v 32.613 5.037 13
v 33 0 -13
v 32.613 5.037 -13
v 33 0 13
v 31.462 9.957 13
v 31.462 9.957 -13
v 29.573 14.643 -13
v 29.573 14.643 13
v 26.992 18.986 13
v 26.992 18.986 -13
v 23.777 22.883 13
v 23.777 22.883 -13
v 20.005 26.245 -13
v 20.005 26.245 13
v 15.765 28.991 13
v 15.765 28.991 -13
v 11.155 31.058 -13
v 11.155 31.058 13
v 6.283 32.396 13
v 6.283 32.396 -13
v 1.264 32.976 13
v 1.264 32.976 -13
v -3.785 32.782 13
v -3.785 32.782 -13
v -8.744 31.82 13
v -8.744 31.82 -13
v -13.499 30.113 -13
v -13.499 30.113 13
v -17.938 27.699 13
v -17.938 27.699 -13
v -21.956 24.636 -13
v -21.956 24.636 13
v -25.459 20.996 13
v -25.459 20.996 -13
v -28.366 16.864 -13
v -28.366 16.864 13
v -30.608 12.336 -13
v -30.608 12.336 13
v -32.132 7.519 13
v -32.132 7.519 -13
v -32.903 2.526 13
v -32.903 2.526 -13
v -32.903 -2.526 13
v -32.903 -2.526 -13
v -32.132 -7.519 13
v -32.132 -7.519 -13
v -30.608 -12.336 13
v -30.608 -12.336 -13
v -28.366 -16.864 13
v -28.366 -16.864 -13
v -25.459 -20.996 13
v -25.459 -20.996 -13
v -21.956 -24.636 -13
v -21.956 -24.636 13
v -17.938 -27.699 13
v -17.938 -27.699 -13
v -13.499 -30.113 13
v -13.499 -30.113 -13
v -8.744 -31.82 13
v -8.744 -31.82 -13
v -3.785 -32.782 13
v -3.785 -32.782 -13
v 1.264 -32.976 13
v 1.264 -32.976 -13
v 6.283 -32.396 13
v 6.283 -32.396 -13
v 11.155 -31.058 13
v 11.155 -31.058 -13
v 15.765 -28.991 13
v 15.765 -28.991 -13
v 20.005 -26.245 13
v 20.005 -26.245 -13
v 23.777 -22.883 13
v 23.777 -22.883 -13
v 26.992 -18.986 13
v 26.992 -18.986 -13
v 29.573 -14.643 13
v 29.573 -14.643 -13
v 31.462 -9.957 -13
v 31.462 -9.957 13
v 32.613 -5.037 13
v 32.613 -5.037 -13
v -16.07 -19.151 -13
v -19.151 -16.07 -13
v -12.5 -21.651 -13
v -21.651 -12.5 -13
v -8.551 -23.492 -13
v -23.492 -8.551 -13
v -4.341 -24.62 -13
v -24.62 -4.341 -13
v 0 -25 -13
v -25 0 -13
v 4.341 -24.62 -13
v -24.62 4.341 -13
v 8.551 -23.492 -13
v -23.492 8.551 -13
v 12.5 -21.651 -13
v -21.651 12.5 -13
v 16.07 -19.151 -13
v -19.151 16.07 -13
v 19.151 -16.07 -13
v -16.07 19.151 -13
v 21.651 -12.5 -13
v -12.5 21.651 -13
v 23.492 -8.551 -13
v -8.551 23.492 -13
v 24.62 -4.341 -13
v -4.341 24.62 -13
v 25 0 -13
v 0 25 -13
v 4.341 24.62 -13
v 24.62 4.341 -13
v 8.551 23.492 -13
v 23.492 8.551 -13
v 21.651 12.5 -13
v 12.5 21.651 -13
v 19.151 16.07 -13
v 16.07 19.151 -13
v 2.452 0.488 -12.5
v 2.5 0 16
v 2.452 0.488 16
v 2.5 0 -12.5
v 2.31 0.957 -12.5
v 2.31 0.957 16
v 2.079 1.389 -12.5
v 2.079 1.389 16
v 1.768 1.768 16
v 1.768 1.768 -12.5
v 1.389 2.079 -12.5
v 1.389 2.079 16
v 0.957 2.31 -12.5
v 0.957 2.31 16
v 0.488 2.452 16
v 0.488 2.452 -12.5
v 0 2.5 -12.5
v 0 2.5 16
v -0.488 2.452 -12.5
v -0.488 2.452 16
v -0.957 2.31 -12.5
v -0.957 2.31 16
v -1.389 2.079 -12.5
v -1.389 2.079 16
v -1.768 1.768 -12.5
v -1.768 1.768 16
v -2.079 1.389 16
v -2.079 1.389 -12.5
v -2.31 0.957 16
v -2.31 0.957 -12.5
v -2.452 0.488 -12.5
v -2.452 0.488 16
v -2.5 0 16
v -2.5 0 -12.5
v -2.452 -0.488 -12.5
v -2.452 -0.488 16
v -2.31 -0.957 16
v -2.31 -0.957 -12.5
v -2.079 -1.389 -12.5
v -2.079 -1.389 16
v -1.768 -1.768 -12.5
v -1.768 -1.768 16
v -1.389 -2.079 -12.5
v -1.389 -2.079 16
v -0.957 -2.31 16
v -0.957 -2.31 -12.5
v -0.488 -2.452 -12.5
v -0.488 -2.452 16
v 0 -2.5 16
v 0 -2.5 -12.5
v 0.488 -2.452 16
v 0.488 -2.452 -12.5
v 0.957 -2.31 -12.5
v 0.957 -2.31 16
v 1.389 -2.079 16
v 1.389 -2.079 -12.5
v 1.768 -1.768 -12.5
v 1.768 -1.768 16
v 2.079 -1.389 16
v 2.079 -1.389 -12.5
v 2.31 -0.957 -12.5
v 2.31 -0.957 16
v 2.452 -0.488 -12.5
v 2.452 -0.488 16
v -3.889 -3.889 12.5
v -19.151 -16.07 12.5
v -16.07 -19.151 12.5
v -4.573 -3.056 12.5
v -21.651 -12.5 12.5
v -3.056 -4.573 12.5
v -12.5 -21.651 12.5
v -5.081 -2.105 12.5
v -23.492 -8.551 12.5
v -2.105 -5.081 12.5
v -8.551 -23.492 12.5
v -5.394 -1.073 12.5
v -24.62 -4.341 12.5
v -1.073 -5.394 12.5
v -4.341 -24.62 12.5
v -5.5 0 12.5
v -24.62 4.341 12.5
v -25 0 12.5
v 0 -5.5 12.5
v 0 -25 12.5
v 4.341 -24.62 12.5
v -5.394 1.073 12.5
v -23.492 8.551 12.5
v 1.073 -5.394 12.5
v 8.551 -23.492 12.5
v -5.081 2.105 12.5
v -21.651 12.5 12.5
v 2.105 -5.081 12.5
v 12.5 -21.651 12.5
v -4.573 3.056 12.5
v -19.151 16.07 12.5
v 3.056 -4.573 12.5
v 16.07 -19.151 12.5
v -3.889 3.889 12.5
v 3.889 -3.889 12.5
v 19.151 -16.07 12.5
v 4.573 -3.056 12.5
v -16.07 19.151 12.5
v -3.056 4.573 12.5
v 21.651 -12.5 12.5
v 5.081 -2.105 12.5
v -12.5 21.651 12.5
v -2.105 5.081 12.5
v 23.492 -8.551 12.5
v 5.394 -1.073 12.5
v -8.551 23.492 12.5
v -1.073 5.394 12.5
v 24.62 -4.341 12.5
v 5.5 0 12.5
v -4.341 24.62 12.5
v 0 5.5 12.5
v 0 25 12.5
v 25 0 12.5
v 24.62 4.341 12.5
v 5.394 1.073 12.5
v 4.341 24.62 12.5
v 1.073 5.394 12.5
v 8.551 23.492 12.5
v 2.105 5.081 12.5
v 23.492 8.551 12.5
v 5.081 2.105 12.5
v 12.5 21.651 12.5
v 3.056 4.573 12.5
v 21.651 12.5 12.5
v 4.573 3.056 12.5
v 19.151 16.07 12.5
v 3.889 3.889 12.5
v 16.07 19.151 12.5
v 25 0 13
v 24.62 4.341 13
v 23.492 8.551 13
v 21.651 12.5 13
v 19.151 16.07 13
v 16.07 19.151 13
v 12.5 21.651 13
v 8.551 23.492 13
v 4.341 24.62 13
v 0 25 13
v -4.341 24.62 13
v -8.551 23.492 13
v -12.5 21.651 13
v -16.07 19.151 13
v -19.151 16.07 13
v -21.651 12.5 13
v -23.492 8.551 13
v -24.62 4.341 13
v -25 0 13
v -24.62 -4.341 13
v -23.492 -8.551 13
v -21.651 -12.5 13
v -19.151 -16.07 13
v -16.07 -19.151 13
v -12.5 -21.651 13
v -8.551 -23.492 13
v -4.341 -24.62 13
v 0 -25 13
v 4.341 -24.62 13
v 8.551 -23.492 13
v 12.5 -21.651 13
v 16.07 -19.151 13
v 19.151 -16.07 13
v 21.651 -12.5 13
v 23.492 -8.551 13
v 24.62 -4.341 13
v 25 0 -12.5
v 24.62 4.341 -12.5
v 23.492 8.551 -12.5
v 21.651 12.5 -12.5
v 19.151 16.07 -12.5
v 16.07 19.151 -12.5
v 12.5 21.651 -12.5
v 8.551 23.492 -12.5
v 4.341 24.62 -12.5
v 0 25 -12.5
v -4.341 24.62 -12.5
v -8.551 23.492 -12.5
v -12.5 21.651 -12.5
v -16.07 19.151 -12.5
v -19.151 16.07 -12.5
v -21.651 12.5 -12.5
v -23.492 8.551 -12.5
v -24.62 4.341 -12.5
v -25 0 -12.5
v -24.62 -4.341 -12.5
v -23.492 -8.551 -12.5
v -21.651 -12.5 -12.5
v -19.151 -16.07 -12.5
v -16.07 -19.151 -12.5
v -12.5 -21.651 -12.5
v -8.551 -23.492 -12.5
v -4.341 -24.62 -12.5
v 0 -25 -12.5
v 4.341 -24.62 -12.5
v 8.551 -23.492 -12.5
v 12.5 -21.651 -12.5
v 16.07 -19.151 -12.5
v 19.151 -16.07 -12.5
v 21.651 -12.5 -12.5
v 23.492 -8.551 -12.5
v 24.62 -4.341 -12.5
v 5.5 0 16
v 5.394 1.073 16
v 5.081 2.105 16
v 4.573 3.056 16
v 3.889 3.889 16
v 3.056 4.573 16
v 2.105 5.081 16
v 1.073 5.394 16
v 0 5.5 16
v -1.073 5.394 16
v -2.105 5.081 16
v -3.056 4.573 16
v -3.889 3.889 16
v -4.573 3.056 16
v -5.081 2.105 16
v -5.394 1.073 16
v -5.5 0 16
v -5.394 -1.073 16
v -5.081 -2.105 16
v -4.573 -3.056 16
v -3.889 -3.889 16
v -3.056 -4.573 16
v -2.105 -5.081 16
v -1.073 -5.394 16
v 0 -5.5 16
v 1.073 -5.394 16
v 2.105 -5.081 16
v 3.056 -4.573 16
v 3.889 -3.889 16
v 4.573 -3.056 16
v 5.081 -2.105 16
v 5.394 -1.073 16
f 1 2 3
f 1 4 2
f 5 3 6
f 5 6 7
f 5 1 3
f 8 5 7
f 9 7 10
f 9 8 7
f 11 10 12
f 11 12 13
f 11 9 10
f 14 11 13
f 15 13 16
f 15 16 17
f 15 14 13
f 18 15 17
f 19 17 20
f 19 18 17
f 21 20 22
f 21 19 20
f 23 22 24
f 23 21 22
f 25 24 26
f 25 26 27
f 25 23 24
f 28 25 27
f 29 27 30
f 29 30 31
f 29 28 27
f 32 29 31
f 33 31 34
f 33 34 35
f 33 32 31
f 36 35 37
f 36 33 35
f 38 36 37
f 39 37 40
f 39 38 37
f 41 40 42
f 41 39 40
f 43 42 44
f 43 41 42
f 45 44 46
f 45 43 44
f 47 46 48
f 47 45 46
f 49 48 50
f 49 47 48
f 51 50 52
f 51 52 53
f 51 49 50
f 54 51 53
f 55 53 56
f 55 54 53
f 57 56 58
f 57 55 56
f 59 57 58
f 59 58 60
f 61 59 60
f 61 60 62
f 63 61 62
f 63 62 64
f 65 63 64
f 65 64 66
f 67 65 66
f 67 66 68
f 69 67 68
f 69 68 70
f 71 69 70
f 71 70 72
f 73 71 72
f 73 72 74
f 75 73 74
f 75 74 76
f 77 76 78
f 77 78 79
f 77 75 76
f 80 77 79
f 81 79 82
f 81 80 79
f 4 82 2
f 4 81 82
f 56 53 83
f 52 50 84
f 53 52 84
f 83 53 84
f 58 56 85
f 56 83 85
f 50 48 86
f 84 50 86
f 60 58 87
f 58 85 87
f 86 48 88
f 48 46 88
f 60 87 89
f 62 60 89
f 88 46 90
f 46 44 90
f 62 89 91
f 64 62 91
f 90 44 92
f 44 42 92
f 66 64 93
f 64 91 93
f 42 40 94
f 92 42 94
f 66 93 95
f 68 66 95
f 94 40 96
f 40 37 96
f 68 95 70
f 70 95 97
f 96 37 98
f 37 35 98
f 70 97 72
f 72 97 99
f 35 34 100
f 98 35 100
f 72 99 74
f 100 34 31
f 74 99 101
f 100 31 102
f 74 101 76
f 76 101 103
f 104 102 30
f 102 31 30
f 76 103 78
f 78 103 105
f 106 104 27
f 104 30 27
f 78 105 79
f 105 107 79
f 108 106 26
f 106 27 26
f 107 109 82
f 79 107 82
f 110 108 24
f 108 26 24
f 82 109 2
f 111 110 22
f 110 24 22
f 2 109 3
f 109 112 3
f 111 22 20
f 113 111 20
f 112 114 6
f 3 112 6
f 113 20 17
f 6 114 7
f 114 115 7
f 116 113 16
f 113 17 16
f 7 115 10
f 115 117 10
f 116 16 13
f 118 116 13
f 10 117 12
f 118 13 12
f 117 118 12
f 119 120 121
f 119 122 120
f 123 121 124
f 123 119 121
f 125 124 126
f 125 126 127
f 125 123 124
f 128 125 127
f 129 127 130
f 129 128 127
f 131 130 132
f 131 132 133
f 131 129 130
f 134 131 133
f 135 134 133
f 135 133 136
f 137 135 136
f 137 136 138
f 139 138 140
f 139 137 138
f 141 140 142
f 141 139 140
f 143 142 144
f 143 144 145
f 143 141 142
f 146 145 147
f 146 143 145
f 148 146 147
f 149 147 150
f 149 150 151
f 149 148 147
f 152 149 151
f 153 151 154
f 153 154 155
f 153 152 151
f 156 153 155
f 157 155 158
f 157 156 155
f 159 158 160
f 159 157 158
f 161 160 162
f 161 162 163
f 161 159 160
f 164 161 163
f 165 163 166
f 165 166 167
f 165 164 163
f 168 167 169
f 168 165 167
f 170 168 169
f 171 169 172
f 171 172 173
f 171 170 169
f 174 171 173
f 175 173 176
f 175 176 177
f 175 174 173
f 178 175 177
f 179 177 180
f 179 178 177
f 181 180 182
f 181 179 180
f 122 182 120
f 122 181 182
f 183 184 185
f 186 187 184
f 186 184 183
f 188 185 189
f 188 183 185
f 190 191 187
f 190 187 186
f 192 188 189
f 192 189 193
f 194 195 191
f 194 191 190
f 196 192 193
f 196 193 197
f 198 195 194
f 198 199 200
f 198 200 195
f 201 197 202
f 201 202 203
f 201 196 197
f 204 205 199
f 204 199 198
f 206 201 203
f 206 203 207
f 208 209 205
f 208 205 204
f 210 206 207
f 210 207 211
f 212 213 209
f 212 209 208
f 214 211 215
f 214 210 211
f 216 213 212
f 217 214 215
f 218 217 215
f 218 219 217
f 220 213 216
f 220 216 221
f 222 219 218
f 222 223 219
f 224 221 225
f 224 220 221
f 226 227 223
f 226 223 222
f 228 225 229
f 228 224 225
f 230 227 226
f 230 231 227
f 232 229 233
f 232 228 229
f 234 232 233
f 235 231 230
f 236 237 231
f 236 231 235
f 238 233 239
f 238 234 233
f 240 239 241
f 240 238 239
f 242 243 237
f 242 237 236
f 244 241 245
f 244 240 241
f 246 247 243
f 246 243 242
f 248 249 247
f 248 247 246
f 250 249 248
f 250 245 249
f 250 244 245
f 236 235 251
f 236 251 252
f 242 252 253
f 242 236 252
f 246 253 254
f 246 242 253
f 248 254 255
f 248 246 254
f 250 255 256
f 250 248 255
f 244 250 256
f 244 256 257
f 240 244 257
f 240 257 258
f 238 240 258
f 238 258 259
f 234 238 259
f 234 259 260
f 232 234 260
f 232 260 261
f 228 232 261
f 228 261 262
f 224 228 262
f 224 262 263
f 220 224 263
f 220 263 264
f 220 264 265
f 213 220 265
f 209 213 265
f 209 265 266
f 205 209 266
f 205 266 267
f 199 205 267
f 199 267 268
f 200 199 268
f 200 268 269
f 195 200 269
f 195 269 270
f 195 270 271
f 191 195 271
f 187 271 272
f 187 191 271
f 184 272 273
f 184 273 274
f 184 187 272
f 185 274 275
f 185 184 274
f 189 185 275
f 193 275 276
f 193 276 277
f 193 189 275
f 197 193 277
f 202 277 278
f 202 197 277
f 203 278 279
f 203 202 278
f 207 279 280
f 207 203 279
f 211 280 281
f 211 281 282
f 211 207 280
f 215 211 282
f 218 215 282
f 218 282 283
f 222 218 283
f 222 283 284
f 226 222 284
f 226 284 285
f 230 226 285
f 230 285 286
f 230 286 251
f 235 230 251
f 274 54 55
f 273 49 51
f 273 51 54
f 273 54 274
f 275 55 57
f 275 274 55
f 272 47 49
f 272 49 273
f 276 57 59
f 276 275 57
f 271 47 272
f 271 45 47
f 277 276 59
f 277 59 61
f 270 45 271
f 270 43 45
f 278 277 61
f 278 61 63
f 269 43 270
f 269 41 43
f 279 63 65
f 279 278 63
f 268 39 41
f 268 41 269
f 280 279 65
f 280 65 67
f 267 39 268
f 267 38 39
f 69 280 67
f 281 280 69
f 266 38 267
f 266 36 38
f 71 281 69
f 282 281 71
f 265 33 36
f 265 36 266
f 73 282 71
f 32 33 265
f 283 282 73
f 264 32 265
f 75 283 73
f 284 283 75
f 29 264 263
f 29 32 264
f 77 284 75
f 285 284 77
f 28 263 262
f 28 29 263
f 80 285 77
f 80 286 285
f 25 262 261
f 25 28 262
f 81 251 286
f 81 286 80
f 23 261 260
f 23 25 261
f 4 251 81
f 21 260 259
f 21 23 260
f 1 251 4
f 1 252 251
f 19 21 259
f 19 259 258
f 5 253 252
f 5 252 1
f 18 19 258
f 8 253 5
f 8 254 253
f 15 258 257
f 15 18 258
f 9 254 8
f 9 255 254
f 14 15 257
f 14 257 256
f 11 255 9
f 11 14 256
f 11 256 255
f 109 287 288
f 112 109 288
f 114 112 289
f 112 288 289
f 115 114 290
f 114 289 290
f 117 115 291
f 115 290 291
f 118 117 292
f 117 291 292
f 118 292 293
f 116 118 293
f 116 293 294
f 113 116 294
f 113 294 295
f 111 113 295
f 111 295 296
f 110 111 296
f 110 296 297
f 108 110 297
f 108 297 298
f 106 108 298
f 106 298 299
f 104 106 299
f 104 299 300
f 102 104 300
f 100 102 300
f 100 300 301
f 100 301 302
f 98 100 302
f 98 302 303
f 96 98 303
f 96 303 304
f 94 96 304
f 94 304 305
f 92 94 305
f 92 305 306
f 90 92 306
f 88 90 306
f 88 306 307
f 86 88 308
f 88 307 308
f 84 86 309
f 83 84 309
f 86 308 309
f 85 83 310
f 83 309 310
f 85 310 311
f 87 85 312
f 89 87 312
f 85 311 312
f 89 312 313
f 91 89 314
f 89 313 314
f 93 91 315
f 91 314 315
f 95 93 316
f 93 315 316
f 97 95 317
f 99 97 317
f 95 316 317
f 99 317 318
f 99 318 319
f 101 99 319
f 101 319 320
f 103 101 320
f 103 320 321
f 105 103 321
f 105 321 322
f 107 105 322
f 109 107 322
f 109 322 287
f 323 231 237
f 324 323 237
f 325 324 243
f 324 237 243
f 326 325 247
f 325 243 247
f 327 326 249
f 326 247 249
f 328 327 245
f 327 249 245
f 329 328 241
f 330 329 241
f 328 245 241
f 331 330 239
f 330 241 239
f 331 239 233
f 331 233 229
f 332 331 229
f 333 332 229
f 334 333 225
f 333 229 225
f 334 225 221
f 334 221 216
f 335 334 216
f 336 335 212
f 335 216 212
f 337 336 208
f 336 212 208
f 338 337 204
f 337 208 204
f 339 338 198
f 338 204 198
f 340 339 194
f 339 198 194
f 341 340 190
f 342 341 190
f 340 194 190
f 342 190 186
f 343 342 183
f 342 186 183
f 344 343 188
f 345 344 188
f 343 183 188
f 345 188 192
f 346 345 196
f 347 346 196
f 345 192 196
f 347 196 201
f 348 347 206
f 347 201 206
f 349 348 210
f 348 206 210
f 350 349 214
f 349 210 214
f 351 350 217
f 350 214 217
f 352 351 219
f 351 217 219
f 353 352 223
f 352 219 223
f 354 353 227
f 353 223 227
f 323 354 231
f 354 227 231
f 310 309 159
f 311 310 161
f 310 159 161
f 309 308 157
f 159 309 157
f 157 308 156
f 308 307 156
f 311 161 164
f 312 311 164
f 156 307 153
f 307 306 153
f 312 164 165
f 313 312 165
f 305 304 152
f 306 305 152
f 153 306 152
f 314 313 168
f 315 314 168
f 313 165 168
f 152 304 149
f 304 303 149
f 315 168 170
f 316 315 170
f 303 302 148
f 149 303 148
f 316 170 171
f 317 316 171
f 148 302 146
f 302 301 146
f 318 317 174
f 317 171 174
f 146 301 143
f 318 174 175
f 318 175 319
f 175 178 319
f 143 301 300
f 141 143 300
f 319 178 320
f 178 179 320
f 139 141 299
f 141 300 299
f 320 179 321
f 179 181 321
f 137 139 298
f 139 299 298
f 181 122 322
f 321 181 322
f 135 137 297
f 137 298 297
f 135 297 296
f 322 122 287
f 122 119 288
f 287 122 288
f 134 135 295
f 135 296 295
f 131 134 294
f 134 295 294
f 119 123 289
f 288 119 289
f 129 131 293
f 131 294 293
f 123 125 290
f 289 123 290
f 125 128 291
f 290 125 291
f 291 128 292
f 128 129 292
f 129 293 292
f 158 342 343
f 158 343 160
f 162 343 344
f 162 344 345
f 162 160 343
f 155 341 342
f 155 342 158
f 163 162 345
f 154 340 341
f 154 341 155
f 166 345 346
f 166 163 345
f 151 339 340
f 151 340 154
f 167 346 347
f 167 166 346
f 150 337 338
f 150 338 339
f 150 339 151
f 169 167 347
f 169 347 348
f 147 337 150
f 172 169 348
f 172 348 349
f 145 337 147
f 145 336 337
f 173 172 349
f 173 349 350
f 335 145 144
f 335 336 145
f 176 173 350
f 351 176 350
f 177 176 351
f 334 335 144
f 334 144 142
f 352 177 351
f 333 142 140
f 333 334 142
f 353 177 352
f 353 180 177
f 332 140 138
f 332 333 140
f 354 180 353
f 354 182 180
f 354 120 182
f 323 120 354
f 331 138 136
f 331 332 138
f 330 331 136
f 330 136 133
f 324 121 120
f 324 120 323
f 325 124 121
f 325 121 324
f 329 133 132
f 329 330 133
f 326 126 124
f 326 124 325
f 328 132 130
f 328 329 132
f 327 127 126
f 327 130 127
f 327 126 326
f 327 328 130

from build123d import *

# Parameters (mm, degrees)
ESTRUSIONE_ESTRUSIONE1_DEPTH      = 13
ESTRUSIONE_ESTRUSIONE1_DEPTH_BACK = 13
SCHIZZO1_R                        = 33
SCHIZZO1_R_2                      = 25
ESTRUSIONE_ESTRUSIONE2_DEPTH      = 12.5
ESTRUSIONE_ESTRUSIONE2_DEPTH_BACK = 12.5
SCHIZZO1_3_R                      = 25
SCHIZZO1_3_R_2                    = 2.5
SCHIZZO2_R                        = 5.5
SCHIZZO2_R_2                      = 2.5
ESTRUSIONE_ESTRUSIONE3_DEPTH      = 3.5


with BuildPart() as part:
    # Schizzo1 → Estrusione-Estrusione1 (new, two sides: drawn at the far end of the back side and taken through both)
    with BuildSketch(Plane.XY.offset(-ESTRUSIONE_ESTRUSIONE1_DEPTH_BACK)):
        Circle(SCHIZZO1_R)
        Circle(SCHIZZO1_R_2, mode=Mode.SUBTRACT)
    extrude(amount=ESTRUSIONE_ESTRUSIONE1_DEPTH + ESTRUSIONE_ESTRUSIONE1_DEPTH_BACK)

    # Schizzo1<3> → Estrusione-Estrusione2 (add, two sides: drawn at the far end of the back side and taken through both)
    with BuildSketch(Plane.XY.offset(-ESTRUSIONE_ESTRUSIONE2_DEPTH_BACK)):
        Circle(SCHIZZO1_3_R)
        Circle(SCHIZZO1_3_R_2, mode=Mode.SUBTRACT)
    extrude(amount=ESTRUSIONE_ESTRUSIONE2_DEPTH + ESTRUSIONE_ESTRUSIONE2_DEPTH_BACK)

    # Schizzo2 → Estrusione-Estrusione3 (add)
    with BuildSketch(Plane.XY.offset(12.5)):
        Circle(SCHIZZO2_R)
        Circle(SCHIZZO2_R_2, mode=Mode.SUBTRACT)
    extrude(amount=ESTRUSIONE_ESTRUSIONE3_DEPTH)


solid = part.part
